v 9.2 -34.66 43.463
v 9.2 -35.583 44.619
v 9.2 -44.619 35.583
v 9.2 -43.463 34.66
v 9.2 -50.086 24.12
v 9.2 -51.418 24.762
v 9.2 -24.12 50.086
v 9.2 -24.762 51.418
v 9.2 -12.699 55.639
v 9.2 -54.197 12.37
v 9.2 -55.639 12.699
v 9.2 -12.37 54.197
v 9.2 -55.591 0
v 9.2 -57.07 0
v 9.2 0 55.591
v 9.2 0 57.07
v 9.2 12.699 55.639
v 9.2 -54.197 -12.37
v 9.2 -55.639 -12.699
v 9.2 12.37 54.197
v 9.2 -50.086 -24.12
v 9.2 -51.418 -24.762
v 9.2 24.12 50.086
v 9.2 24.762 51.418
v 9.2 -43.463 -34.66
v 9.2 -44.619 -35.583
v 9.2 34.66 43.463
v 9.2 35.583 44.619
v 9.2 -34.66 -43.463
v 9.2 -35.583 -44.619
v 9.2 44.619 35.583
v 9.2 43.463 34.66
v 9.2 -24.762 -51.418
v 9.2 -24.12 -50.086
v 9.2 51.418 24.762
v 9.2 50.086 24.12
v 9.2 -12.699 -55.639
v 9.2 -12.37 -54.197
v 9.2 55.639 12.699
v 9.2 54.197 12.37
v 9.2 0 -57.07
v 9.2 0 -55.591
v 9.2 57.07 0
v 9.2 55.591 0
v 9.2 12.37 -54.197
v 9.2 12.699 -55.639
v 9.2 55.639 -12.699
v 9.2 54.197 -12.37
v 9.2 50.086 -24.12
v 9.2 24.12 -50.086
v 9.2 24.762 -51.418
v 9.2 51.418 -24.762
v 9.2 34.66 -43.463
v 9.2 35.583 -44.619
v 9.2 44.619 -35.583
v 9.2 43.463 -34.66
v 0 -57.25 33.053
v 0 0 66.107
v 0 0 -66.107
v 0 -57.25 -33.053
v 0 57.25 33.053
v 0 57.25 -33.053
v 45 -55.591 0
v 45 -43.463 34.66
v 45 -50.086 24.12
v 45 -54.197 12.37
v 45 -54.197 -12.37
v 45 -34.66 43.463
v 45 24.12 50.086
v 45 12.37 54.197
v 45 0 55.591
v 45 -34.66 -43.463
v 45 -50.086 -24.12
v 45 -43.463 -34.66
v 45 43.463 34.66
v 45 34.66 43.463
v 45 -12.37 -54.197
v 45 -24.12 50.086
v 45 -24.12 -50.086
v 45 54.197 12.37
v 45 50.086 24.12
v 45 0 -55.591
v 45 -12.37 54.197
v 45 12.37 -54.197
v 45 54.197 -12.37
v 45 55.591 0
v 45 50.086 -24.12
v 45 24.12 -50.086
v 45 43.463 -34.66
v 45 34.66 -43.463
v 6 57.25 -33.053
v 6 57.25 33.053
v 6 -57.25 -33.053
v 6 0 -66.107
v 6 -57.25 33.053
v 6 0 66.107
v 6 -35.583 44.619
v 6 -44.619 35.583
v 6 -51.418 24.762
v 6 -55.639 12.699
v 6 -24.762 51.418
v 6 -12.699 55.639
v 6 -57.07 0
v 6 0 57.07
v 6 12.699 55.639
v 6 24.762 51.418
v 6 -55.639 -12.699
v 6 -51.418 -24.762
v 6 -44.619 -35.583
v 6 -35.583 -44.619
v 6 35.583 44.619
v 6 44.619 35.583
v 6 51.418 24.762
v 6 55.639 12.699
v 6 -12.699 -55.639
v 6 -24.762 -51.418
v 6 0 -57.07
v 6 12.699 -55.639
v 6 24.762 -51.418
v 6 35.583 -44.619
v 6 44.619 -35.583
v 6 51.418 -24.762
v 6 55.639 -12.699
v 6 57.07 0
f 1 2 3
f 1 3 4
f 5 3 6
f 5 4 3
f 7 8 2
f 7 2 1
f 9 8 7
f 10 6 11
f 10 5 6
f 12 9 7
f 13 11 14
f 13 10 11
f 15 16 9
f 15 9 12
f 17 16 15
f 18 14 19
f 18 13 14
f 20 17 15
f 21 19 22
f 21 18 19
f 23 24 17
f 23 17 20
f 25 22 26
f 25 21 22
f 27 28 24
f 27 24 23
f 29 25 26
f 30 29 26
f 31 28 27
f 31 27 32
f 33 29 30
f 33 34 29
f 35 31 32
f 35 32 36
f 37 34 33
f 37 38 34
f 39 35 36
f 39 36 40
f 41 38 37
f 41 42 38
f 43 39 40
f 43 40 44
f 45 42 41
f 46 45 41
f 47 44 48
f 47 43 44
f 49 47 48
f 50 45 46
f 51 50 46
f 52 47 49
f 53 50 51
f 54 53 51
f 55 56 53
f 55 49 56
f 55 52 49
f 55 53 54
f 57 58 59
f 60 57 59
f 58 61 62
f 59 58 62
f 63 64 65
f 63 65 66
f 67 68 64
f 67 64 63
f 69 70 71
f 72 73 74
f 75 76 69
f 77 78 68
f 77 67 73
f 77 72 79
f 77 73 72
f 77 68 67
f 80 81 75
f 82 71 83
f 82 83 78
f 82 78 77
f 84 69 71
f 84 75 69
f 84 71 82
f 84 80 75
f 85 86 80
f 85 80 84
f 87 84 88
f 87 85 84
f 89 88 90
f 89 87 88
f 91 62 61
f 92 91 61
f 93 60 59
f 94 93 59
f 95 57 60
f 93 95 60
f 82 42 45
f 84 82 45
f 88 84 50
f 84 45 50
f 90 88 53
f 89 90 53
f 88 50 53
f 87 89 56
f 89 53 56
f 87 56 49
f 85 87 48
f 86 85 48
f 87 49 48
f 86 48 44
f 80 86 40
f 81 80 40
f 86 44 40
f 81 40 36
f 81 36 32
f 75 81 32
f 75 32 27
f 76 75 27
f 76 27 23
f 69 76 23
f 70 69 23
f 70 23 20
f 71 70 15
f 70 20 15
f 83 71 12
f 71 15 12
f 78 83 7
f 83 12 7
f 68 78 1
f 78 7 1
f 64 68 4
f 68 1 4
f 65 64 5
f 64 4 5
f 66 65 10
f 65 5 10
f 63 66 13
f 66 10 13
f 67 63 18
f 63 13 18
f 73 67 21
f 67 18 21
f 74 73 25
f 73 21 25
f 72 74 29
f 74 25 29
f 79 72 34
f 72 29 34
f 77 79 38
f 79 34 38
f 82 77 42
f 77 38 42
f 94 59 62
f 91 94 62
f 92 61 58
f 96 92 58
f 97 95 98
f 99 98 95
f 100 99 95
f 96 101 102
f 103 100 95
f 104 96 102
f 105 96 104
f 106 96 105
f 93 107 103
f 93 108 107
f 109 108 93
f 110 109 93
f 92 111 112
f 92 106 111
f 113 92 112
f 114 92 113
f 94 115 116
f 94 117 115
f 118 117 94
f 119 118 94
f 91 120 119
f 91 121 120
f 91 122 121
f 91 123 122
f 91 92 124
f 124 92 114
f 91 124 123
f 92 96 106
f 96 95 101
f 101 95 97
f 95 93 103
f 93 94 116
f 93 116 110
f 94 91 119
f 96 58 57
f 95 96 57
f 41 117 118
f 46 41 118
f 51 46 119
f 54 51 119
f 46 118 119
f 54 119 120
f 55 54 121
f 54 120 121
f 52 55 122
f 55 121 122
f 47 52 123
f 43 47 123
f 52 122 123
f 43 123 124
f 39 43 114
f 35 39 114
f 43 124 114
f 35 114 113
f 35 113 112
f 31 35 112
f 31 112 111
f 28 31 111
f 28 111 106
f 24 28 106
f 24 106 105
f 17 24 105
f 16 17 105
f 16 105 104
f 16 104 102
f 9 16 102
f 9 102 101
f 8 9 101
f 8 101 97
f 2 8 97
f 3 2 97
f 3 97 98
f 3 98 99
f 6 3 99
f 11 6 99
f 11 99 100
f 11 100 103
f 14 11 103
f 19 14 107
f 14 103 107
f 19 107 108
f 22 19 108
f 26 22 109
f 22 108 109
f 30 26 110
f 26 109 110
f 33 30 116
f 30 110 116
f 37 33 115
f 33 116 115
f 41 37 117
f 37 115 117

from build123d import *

# Parameters (mm, degrees)
BOSS_EXTRUDE1_DEPTH = 6
SKETCH2_R           = 57.07
BOSS_EXTRUDE2_DEPTH = 39
CUT_EXTRUDE1_START  = -35.8
SKETCH3_R           = 57.07
SKETCH3_R_2         = 55.591
CUT_EXTRUDE1_DEPTH  = 35.8


with BuildPart() as part:
    # Sketch1 → Boss-Extrude1 (new body)
    with BuildSketch(Plane(origin=(0, 0, 0), x_dir=(0, 0, -1), z_dir=(1, 0, 0))):
        Polygon((33.053302911, 57.25), (-33.053302911, 57.25), (-66.106605822, 0), (-33.053302911, -57.25), (33.053302911, -57.25), (66.106605822, 0), align=None)
    extrude(amount=BOSS_EXTRUDE1_DEPTH)

    # Sketch2 → Boss-Extrude2 (add)
    with BuildSketch(Plane(origin=(6, 0, 0), x_dir=(0, 0, -1), z_dir=(1, 0, 0))):
        Circle(SKETCH2_R)
    extrude(amount=BOSS_EXTRUDE2_DEPTH)

    # Sketch3 → Cut-Extrude1 (cut)
    with BuildSketch(Plane(origin=(45, 0, 0), x_dir=(0, 0, -1), z_dir=(1, 0, 0)).offset(CUT_EXTRUDE1_START)):
        Circle(SKETCH3_R)
        Circle(SKETCH3_R_2, mode=Mode.SUBTRACT)
    extrude(amount=CUT_EXTRUDE1_DEPTH, mode=Mode.SUBTRACT)


solid = part.part
